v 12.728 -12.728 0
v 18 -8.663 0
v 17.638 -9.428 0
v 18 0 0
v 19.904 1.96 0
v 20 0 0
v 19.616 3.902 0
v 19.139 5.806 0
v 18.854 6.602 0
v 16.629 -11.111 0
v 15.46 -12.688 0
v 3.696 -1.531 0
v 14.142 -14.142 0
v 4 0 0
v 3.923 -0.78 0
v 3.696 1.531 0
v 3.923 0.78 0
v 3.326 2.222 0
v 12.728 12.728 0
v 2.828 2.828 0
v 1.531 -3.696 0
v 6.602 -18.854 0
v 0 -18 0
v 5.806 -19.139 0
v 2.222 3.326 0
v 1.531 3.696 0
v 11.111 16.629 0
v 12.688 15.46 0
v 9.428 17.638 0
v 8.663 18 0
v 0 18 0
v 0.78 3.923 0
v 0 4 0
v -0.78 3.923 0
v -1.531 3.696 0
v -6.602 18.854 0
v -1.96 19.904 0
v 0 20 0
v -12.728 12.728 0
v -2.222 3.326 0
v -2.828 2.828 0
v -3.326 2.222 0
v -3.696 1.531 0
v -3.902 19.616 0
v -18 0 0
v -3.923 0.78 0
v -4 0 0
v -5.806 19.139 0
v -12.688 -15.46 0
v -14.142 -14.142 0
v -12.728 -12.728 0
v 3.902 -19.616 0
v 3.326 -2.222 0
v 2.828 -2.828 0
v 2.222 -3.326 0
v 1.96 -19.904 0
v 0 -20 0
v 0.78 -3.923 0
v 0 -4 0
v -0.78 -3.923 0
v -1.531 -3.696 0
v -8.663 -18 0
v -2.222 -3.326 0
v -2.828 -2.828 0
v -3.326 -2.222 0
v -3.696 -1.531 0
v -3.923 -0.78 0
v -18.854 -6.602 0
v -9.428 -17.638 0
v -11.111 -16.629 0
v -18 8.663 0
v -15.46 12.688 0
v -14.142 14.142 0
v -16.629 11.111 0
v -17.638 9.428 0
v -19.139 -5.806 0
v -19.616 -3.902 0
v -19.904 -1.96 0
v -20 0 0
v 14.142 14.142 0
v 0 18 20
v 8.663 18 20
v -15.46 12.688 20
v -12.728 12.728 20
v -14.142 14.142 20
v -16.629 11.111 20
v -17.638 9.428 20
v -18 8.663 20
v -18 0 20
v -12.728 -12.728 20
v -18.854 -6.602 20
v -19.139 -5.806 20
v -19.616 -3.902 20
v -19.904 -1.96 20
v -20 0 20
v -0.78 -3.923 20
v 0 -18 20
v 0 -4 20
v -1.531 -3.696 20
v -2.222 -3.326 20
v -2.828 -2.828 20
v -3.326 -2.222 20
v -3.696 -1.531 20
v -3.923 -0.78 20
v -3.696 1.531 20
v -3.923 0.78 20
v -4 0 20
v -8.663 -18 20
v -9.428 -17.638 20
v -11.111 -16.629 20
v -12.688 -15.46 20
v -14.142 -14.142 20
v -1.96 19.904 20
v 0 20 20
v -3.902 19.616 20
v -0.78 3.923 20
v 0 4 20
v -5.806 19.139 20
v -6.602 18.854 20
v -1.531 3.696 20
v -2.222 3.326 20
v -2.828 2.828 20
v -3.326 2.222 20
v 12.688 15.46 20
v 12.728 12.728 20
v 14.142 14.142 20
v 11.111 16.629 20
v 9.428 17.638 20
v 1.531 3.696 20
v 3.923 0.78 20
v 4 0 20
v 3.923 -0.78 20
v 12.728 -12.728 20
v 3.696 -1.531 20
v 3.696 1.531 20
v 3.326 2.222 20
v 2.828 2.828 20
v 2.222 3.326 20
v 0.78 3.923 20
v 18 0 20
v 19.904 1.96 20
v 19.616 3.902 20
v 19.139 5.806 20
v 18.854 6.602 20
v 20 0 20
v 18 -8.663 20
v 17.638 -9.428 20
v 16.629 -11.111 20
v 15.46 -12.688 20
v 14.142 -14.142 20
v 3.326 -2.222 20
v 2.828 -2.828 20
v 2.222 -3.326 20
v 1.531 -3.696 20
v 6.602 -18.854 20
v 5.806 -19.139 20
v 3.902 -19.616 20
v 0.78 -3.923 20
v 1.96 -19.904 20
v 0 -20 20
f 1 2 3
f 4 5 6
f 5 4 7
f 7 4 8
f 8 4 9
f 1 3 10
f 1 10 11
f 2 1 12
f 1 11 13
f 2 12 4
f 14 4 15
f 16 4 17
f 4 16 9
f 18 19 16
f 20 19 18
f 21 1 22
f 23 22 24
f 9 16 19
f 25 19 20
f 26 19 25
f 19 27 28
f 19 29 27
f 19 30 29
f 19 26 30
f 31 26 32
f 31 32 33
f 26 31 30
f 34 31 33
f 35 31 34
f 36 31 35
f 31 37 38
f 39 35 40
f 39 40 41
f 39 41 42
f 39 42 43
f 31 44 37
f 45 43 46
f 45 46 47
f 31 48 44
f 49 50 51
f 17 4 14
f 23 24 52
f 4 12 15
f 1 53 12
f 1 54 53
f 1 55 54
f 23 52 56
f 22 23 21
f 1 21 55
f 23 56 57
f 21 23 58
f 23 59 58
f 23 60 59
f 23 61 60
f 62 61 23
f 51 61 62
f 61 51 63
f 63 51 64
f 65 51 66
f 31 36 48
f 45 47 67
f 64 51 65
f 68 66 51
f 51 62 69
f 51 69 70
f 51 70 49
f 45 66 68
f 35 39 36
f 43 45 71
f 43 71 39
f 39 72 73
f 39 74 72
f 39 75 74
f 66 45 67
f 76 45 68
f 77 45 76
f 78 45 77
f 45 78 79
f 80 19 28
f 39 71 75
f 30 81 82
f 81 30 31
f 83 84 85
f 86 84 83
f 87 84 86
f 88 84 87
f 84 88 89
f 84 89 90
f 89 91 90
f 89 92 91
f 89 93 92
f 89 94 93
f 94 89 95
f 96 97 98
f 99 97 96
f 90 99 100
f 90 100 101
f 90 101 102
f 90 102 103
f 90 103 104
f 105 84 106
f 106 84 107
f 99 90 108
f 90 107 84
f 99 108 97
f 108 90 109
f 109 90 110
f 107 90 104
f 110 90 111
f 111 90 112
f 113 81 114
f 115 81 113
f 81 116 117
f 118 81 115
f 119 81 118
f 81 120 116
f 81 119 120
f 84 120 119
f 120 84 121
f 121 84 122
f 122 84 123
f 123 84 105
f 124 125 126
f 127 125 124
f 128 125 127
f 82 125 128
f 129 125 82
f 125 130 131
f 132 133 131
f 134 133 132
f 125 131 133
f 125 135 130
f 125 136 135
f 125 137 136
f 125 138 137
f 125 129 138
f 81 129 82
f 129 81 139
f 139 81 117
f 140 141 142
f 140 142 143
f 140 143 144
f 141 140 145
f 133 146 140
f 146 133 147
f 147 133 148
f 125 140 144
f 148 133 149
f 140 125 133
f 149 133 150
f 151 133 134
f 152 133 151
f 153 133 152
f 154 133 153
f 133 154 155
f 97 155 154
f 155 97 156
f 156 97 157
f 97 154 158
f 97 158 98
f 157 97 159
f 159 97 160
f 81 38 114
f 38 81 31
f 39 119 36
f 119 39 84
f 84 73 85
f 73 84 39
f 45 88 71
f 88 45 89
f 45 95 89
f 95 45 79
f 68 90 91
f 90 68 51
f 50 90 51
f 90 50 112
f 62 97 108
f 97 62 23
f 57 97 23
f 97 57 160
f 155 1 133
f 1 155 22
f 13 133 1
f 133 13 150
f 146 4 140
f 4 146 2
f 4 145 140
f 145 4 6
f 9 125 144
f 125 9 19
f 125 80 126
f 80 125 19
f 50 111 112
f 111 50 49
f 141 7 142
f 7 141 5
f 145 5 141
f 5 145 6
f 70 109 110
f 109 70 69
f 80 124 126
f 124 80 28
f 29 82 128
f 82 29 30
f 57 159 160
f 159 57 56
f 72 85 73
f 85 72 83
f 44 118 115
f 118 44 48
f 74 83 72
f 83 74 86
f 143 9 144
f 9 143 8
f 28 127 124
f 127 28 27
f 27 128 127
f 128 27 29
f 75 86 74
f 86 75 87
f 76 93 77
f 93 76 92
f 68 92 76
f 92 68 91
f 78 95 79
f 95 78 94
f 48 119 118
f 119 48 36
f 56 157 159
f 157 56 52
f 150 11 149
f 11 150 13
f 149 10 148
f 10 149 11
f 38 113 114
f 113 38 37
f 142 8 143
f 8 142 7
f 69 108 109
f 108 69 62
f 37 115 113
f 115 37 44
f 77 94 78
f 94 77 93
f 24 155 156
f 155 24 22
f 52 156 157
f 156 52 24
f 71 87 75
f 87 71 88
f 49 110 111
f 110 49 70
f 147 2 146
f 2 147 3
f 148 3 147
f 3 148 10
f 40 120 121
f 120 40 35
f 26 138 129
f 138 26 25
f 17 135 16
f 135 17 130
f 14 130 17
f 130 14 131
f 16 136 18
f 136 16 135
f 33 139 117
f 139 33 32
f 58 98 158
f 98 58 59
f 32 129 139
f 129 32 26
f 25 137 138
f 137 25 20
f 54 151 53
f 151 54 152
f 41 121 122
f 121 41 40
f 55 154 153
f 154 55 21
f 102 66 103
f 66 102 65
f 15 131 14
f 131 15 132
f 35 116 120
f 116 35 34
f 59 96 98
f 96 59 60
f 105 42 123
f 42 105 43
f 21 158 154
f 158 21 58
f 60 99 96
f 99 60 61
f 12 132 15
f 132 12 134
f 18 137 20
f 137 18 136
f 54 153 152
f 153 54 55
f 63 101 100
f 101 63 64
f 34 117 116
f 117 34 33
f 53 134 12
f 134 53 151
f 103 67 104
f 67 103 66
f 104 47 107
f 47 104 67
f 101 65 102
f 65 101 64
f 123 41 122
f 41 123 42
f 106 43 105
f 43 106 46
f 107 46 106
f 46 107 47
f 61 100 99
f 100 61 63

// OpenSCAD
module rotor() {
    // Параметры ротора
    outer_diameter = 40;
    width = 20;
    inner_diameter = 12;
    slot_count = 8;
    slot_depth = 4;
    shaft_diameter = 8;
    
    // Основной цилиндр ротора
    difference() {
        cylinder(h = width, d = outer_diameter, $fn = 64);
        
        // Центральный валик
        cylinder(h = width + 2, d = shaft_diameter, $fn = 32);
        
        // Пазы для магнитов
        for(i = [0 : 360/slot_count : 360-360/slot_count]) {
            rotate([0, 0, i])
            linear_extrude(height = width)
            difference() {
                square([outer_diameter/2 - inner_diameter/2 - slot_depth, width]);
                square([outer_diameter/2 - inner_diameter/2 - slot_depth + 1, width - 2]);
            }
        }
    }
}

rotor();
